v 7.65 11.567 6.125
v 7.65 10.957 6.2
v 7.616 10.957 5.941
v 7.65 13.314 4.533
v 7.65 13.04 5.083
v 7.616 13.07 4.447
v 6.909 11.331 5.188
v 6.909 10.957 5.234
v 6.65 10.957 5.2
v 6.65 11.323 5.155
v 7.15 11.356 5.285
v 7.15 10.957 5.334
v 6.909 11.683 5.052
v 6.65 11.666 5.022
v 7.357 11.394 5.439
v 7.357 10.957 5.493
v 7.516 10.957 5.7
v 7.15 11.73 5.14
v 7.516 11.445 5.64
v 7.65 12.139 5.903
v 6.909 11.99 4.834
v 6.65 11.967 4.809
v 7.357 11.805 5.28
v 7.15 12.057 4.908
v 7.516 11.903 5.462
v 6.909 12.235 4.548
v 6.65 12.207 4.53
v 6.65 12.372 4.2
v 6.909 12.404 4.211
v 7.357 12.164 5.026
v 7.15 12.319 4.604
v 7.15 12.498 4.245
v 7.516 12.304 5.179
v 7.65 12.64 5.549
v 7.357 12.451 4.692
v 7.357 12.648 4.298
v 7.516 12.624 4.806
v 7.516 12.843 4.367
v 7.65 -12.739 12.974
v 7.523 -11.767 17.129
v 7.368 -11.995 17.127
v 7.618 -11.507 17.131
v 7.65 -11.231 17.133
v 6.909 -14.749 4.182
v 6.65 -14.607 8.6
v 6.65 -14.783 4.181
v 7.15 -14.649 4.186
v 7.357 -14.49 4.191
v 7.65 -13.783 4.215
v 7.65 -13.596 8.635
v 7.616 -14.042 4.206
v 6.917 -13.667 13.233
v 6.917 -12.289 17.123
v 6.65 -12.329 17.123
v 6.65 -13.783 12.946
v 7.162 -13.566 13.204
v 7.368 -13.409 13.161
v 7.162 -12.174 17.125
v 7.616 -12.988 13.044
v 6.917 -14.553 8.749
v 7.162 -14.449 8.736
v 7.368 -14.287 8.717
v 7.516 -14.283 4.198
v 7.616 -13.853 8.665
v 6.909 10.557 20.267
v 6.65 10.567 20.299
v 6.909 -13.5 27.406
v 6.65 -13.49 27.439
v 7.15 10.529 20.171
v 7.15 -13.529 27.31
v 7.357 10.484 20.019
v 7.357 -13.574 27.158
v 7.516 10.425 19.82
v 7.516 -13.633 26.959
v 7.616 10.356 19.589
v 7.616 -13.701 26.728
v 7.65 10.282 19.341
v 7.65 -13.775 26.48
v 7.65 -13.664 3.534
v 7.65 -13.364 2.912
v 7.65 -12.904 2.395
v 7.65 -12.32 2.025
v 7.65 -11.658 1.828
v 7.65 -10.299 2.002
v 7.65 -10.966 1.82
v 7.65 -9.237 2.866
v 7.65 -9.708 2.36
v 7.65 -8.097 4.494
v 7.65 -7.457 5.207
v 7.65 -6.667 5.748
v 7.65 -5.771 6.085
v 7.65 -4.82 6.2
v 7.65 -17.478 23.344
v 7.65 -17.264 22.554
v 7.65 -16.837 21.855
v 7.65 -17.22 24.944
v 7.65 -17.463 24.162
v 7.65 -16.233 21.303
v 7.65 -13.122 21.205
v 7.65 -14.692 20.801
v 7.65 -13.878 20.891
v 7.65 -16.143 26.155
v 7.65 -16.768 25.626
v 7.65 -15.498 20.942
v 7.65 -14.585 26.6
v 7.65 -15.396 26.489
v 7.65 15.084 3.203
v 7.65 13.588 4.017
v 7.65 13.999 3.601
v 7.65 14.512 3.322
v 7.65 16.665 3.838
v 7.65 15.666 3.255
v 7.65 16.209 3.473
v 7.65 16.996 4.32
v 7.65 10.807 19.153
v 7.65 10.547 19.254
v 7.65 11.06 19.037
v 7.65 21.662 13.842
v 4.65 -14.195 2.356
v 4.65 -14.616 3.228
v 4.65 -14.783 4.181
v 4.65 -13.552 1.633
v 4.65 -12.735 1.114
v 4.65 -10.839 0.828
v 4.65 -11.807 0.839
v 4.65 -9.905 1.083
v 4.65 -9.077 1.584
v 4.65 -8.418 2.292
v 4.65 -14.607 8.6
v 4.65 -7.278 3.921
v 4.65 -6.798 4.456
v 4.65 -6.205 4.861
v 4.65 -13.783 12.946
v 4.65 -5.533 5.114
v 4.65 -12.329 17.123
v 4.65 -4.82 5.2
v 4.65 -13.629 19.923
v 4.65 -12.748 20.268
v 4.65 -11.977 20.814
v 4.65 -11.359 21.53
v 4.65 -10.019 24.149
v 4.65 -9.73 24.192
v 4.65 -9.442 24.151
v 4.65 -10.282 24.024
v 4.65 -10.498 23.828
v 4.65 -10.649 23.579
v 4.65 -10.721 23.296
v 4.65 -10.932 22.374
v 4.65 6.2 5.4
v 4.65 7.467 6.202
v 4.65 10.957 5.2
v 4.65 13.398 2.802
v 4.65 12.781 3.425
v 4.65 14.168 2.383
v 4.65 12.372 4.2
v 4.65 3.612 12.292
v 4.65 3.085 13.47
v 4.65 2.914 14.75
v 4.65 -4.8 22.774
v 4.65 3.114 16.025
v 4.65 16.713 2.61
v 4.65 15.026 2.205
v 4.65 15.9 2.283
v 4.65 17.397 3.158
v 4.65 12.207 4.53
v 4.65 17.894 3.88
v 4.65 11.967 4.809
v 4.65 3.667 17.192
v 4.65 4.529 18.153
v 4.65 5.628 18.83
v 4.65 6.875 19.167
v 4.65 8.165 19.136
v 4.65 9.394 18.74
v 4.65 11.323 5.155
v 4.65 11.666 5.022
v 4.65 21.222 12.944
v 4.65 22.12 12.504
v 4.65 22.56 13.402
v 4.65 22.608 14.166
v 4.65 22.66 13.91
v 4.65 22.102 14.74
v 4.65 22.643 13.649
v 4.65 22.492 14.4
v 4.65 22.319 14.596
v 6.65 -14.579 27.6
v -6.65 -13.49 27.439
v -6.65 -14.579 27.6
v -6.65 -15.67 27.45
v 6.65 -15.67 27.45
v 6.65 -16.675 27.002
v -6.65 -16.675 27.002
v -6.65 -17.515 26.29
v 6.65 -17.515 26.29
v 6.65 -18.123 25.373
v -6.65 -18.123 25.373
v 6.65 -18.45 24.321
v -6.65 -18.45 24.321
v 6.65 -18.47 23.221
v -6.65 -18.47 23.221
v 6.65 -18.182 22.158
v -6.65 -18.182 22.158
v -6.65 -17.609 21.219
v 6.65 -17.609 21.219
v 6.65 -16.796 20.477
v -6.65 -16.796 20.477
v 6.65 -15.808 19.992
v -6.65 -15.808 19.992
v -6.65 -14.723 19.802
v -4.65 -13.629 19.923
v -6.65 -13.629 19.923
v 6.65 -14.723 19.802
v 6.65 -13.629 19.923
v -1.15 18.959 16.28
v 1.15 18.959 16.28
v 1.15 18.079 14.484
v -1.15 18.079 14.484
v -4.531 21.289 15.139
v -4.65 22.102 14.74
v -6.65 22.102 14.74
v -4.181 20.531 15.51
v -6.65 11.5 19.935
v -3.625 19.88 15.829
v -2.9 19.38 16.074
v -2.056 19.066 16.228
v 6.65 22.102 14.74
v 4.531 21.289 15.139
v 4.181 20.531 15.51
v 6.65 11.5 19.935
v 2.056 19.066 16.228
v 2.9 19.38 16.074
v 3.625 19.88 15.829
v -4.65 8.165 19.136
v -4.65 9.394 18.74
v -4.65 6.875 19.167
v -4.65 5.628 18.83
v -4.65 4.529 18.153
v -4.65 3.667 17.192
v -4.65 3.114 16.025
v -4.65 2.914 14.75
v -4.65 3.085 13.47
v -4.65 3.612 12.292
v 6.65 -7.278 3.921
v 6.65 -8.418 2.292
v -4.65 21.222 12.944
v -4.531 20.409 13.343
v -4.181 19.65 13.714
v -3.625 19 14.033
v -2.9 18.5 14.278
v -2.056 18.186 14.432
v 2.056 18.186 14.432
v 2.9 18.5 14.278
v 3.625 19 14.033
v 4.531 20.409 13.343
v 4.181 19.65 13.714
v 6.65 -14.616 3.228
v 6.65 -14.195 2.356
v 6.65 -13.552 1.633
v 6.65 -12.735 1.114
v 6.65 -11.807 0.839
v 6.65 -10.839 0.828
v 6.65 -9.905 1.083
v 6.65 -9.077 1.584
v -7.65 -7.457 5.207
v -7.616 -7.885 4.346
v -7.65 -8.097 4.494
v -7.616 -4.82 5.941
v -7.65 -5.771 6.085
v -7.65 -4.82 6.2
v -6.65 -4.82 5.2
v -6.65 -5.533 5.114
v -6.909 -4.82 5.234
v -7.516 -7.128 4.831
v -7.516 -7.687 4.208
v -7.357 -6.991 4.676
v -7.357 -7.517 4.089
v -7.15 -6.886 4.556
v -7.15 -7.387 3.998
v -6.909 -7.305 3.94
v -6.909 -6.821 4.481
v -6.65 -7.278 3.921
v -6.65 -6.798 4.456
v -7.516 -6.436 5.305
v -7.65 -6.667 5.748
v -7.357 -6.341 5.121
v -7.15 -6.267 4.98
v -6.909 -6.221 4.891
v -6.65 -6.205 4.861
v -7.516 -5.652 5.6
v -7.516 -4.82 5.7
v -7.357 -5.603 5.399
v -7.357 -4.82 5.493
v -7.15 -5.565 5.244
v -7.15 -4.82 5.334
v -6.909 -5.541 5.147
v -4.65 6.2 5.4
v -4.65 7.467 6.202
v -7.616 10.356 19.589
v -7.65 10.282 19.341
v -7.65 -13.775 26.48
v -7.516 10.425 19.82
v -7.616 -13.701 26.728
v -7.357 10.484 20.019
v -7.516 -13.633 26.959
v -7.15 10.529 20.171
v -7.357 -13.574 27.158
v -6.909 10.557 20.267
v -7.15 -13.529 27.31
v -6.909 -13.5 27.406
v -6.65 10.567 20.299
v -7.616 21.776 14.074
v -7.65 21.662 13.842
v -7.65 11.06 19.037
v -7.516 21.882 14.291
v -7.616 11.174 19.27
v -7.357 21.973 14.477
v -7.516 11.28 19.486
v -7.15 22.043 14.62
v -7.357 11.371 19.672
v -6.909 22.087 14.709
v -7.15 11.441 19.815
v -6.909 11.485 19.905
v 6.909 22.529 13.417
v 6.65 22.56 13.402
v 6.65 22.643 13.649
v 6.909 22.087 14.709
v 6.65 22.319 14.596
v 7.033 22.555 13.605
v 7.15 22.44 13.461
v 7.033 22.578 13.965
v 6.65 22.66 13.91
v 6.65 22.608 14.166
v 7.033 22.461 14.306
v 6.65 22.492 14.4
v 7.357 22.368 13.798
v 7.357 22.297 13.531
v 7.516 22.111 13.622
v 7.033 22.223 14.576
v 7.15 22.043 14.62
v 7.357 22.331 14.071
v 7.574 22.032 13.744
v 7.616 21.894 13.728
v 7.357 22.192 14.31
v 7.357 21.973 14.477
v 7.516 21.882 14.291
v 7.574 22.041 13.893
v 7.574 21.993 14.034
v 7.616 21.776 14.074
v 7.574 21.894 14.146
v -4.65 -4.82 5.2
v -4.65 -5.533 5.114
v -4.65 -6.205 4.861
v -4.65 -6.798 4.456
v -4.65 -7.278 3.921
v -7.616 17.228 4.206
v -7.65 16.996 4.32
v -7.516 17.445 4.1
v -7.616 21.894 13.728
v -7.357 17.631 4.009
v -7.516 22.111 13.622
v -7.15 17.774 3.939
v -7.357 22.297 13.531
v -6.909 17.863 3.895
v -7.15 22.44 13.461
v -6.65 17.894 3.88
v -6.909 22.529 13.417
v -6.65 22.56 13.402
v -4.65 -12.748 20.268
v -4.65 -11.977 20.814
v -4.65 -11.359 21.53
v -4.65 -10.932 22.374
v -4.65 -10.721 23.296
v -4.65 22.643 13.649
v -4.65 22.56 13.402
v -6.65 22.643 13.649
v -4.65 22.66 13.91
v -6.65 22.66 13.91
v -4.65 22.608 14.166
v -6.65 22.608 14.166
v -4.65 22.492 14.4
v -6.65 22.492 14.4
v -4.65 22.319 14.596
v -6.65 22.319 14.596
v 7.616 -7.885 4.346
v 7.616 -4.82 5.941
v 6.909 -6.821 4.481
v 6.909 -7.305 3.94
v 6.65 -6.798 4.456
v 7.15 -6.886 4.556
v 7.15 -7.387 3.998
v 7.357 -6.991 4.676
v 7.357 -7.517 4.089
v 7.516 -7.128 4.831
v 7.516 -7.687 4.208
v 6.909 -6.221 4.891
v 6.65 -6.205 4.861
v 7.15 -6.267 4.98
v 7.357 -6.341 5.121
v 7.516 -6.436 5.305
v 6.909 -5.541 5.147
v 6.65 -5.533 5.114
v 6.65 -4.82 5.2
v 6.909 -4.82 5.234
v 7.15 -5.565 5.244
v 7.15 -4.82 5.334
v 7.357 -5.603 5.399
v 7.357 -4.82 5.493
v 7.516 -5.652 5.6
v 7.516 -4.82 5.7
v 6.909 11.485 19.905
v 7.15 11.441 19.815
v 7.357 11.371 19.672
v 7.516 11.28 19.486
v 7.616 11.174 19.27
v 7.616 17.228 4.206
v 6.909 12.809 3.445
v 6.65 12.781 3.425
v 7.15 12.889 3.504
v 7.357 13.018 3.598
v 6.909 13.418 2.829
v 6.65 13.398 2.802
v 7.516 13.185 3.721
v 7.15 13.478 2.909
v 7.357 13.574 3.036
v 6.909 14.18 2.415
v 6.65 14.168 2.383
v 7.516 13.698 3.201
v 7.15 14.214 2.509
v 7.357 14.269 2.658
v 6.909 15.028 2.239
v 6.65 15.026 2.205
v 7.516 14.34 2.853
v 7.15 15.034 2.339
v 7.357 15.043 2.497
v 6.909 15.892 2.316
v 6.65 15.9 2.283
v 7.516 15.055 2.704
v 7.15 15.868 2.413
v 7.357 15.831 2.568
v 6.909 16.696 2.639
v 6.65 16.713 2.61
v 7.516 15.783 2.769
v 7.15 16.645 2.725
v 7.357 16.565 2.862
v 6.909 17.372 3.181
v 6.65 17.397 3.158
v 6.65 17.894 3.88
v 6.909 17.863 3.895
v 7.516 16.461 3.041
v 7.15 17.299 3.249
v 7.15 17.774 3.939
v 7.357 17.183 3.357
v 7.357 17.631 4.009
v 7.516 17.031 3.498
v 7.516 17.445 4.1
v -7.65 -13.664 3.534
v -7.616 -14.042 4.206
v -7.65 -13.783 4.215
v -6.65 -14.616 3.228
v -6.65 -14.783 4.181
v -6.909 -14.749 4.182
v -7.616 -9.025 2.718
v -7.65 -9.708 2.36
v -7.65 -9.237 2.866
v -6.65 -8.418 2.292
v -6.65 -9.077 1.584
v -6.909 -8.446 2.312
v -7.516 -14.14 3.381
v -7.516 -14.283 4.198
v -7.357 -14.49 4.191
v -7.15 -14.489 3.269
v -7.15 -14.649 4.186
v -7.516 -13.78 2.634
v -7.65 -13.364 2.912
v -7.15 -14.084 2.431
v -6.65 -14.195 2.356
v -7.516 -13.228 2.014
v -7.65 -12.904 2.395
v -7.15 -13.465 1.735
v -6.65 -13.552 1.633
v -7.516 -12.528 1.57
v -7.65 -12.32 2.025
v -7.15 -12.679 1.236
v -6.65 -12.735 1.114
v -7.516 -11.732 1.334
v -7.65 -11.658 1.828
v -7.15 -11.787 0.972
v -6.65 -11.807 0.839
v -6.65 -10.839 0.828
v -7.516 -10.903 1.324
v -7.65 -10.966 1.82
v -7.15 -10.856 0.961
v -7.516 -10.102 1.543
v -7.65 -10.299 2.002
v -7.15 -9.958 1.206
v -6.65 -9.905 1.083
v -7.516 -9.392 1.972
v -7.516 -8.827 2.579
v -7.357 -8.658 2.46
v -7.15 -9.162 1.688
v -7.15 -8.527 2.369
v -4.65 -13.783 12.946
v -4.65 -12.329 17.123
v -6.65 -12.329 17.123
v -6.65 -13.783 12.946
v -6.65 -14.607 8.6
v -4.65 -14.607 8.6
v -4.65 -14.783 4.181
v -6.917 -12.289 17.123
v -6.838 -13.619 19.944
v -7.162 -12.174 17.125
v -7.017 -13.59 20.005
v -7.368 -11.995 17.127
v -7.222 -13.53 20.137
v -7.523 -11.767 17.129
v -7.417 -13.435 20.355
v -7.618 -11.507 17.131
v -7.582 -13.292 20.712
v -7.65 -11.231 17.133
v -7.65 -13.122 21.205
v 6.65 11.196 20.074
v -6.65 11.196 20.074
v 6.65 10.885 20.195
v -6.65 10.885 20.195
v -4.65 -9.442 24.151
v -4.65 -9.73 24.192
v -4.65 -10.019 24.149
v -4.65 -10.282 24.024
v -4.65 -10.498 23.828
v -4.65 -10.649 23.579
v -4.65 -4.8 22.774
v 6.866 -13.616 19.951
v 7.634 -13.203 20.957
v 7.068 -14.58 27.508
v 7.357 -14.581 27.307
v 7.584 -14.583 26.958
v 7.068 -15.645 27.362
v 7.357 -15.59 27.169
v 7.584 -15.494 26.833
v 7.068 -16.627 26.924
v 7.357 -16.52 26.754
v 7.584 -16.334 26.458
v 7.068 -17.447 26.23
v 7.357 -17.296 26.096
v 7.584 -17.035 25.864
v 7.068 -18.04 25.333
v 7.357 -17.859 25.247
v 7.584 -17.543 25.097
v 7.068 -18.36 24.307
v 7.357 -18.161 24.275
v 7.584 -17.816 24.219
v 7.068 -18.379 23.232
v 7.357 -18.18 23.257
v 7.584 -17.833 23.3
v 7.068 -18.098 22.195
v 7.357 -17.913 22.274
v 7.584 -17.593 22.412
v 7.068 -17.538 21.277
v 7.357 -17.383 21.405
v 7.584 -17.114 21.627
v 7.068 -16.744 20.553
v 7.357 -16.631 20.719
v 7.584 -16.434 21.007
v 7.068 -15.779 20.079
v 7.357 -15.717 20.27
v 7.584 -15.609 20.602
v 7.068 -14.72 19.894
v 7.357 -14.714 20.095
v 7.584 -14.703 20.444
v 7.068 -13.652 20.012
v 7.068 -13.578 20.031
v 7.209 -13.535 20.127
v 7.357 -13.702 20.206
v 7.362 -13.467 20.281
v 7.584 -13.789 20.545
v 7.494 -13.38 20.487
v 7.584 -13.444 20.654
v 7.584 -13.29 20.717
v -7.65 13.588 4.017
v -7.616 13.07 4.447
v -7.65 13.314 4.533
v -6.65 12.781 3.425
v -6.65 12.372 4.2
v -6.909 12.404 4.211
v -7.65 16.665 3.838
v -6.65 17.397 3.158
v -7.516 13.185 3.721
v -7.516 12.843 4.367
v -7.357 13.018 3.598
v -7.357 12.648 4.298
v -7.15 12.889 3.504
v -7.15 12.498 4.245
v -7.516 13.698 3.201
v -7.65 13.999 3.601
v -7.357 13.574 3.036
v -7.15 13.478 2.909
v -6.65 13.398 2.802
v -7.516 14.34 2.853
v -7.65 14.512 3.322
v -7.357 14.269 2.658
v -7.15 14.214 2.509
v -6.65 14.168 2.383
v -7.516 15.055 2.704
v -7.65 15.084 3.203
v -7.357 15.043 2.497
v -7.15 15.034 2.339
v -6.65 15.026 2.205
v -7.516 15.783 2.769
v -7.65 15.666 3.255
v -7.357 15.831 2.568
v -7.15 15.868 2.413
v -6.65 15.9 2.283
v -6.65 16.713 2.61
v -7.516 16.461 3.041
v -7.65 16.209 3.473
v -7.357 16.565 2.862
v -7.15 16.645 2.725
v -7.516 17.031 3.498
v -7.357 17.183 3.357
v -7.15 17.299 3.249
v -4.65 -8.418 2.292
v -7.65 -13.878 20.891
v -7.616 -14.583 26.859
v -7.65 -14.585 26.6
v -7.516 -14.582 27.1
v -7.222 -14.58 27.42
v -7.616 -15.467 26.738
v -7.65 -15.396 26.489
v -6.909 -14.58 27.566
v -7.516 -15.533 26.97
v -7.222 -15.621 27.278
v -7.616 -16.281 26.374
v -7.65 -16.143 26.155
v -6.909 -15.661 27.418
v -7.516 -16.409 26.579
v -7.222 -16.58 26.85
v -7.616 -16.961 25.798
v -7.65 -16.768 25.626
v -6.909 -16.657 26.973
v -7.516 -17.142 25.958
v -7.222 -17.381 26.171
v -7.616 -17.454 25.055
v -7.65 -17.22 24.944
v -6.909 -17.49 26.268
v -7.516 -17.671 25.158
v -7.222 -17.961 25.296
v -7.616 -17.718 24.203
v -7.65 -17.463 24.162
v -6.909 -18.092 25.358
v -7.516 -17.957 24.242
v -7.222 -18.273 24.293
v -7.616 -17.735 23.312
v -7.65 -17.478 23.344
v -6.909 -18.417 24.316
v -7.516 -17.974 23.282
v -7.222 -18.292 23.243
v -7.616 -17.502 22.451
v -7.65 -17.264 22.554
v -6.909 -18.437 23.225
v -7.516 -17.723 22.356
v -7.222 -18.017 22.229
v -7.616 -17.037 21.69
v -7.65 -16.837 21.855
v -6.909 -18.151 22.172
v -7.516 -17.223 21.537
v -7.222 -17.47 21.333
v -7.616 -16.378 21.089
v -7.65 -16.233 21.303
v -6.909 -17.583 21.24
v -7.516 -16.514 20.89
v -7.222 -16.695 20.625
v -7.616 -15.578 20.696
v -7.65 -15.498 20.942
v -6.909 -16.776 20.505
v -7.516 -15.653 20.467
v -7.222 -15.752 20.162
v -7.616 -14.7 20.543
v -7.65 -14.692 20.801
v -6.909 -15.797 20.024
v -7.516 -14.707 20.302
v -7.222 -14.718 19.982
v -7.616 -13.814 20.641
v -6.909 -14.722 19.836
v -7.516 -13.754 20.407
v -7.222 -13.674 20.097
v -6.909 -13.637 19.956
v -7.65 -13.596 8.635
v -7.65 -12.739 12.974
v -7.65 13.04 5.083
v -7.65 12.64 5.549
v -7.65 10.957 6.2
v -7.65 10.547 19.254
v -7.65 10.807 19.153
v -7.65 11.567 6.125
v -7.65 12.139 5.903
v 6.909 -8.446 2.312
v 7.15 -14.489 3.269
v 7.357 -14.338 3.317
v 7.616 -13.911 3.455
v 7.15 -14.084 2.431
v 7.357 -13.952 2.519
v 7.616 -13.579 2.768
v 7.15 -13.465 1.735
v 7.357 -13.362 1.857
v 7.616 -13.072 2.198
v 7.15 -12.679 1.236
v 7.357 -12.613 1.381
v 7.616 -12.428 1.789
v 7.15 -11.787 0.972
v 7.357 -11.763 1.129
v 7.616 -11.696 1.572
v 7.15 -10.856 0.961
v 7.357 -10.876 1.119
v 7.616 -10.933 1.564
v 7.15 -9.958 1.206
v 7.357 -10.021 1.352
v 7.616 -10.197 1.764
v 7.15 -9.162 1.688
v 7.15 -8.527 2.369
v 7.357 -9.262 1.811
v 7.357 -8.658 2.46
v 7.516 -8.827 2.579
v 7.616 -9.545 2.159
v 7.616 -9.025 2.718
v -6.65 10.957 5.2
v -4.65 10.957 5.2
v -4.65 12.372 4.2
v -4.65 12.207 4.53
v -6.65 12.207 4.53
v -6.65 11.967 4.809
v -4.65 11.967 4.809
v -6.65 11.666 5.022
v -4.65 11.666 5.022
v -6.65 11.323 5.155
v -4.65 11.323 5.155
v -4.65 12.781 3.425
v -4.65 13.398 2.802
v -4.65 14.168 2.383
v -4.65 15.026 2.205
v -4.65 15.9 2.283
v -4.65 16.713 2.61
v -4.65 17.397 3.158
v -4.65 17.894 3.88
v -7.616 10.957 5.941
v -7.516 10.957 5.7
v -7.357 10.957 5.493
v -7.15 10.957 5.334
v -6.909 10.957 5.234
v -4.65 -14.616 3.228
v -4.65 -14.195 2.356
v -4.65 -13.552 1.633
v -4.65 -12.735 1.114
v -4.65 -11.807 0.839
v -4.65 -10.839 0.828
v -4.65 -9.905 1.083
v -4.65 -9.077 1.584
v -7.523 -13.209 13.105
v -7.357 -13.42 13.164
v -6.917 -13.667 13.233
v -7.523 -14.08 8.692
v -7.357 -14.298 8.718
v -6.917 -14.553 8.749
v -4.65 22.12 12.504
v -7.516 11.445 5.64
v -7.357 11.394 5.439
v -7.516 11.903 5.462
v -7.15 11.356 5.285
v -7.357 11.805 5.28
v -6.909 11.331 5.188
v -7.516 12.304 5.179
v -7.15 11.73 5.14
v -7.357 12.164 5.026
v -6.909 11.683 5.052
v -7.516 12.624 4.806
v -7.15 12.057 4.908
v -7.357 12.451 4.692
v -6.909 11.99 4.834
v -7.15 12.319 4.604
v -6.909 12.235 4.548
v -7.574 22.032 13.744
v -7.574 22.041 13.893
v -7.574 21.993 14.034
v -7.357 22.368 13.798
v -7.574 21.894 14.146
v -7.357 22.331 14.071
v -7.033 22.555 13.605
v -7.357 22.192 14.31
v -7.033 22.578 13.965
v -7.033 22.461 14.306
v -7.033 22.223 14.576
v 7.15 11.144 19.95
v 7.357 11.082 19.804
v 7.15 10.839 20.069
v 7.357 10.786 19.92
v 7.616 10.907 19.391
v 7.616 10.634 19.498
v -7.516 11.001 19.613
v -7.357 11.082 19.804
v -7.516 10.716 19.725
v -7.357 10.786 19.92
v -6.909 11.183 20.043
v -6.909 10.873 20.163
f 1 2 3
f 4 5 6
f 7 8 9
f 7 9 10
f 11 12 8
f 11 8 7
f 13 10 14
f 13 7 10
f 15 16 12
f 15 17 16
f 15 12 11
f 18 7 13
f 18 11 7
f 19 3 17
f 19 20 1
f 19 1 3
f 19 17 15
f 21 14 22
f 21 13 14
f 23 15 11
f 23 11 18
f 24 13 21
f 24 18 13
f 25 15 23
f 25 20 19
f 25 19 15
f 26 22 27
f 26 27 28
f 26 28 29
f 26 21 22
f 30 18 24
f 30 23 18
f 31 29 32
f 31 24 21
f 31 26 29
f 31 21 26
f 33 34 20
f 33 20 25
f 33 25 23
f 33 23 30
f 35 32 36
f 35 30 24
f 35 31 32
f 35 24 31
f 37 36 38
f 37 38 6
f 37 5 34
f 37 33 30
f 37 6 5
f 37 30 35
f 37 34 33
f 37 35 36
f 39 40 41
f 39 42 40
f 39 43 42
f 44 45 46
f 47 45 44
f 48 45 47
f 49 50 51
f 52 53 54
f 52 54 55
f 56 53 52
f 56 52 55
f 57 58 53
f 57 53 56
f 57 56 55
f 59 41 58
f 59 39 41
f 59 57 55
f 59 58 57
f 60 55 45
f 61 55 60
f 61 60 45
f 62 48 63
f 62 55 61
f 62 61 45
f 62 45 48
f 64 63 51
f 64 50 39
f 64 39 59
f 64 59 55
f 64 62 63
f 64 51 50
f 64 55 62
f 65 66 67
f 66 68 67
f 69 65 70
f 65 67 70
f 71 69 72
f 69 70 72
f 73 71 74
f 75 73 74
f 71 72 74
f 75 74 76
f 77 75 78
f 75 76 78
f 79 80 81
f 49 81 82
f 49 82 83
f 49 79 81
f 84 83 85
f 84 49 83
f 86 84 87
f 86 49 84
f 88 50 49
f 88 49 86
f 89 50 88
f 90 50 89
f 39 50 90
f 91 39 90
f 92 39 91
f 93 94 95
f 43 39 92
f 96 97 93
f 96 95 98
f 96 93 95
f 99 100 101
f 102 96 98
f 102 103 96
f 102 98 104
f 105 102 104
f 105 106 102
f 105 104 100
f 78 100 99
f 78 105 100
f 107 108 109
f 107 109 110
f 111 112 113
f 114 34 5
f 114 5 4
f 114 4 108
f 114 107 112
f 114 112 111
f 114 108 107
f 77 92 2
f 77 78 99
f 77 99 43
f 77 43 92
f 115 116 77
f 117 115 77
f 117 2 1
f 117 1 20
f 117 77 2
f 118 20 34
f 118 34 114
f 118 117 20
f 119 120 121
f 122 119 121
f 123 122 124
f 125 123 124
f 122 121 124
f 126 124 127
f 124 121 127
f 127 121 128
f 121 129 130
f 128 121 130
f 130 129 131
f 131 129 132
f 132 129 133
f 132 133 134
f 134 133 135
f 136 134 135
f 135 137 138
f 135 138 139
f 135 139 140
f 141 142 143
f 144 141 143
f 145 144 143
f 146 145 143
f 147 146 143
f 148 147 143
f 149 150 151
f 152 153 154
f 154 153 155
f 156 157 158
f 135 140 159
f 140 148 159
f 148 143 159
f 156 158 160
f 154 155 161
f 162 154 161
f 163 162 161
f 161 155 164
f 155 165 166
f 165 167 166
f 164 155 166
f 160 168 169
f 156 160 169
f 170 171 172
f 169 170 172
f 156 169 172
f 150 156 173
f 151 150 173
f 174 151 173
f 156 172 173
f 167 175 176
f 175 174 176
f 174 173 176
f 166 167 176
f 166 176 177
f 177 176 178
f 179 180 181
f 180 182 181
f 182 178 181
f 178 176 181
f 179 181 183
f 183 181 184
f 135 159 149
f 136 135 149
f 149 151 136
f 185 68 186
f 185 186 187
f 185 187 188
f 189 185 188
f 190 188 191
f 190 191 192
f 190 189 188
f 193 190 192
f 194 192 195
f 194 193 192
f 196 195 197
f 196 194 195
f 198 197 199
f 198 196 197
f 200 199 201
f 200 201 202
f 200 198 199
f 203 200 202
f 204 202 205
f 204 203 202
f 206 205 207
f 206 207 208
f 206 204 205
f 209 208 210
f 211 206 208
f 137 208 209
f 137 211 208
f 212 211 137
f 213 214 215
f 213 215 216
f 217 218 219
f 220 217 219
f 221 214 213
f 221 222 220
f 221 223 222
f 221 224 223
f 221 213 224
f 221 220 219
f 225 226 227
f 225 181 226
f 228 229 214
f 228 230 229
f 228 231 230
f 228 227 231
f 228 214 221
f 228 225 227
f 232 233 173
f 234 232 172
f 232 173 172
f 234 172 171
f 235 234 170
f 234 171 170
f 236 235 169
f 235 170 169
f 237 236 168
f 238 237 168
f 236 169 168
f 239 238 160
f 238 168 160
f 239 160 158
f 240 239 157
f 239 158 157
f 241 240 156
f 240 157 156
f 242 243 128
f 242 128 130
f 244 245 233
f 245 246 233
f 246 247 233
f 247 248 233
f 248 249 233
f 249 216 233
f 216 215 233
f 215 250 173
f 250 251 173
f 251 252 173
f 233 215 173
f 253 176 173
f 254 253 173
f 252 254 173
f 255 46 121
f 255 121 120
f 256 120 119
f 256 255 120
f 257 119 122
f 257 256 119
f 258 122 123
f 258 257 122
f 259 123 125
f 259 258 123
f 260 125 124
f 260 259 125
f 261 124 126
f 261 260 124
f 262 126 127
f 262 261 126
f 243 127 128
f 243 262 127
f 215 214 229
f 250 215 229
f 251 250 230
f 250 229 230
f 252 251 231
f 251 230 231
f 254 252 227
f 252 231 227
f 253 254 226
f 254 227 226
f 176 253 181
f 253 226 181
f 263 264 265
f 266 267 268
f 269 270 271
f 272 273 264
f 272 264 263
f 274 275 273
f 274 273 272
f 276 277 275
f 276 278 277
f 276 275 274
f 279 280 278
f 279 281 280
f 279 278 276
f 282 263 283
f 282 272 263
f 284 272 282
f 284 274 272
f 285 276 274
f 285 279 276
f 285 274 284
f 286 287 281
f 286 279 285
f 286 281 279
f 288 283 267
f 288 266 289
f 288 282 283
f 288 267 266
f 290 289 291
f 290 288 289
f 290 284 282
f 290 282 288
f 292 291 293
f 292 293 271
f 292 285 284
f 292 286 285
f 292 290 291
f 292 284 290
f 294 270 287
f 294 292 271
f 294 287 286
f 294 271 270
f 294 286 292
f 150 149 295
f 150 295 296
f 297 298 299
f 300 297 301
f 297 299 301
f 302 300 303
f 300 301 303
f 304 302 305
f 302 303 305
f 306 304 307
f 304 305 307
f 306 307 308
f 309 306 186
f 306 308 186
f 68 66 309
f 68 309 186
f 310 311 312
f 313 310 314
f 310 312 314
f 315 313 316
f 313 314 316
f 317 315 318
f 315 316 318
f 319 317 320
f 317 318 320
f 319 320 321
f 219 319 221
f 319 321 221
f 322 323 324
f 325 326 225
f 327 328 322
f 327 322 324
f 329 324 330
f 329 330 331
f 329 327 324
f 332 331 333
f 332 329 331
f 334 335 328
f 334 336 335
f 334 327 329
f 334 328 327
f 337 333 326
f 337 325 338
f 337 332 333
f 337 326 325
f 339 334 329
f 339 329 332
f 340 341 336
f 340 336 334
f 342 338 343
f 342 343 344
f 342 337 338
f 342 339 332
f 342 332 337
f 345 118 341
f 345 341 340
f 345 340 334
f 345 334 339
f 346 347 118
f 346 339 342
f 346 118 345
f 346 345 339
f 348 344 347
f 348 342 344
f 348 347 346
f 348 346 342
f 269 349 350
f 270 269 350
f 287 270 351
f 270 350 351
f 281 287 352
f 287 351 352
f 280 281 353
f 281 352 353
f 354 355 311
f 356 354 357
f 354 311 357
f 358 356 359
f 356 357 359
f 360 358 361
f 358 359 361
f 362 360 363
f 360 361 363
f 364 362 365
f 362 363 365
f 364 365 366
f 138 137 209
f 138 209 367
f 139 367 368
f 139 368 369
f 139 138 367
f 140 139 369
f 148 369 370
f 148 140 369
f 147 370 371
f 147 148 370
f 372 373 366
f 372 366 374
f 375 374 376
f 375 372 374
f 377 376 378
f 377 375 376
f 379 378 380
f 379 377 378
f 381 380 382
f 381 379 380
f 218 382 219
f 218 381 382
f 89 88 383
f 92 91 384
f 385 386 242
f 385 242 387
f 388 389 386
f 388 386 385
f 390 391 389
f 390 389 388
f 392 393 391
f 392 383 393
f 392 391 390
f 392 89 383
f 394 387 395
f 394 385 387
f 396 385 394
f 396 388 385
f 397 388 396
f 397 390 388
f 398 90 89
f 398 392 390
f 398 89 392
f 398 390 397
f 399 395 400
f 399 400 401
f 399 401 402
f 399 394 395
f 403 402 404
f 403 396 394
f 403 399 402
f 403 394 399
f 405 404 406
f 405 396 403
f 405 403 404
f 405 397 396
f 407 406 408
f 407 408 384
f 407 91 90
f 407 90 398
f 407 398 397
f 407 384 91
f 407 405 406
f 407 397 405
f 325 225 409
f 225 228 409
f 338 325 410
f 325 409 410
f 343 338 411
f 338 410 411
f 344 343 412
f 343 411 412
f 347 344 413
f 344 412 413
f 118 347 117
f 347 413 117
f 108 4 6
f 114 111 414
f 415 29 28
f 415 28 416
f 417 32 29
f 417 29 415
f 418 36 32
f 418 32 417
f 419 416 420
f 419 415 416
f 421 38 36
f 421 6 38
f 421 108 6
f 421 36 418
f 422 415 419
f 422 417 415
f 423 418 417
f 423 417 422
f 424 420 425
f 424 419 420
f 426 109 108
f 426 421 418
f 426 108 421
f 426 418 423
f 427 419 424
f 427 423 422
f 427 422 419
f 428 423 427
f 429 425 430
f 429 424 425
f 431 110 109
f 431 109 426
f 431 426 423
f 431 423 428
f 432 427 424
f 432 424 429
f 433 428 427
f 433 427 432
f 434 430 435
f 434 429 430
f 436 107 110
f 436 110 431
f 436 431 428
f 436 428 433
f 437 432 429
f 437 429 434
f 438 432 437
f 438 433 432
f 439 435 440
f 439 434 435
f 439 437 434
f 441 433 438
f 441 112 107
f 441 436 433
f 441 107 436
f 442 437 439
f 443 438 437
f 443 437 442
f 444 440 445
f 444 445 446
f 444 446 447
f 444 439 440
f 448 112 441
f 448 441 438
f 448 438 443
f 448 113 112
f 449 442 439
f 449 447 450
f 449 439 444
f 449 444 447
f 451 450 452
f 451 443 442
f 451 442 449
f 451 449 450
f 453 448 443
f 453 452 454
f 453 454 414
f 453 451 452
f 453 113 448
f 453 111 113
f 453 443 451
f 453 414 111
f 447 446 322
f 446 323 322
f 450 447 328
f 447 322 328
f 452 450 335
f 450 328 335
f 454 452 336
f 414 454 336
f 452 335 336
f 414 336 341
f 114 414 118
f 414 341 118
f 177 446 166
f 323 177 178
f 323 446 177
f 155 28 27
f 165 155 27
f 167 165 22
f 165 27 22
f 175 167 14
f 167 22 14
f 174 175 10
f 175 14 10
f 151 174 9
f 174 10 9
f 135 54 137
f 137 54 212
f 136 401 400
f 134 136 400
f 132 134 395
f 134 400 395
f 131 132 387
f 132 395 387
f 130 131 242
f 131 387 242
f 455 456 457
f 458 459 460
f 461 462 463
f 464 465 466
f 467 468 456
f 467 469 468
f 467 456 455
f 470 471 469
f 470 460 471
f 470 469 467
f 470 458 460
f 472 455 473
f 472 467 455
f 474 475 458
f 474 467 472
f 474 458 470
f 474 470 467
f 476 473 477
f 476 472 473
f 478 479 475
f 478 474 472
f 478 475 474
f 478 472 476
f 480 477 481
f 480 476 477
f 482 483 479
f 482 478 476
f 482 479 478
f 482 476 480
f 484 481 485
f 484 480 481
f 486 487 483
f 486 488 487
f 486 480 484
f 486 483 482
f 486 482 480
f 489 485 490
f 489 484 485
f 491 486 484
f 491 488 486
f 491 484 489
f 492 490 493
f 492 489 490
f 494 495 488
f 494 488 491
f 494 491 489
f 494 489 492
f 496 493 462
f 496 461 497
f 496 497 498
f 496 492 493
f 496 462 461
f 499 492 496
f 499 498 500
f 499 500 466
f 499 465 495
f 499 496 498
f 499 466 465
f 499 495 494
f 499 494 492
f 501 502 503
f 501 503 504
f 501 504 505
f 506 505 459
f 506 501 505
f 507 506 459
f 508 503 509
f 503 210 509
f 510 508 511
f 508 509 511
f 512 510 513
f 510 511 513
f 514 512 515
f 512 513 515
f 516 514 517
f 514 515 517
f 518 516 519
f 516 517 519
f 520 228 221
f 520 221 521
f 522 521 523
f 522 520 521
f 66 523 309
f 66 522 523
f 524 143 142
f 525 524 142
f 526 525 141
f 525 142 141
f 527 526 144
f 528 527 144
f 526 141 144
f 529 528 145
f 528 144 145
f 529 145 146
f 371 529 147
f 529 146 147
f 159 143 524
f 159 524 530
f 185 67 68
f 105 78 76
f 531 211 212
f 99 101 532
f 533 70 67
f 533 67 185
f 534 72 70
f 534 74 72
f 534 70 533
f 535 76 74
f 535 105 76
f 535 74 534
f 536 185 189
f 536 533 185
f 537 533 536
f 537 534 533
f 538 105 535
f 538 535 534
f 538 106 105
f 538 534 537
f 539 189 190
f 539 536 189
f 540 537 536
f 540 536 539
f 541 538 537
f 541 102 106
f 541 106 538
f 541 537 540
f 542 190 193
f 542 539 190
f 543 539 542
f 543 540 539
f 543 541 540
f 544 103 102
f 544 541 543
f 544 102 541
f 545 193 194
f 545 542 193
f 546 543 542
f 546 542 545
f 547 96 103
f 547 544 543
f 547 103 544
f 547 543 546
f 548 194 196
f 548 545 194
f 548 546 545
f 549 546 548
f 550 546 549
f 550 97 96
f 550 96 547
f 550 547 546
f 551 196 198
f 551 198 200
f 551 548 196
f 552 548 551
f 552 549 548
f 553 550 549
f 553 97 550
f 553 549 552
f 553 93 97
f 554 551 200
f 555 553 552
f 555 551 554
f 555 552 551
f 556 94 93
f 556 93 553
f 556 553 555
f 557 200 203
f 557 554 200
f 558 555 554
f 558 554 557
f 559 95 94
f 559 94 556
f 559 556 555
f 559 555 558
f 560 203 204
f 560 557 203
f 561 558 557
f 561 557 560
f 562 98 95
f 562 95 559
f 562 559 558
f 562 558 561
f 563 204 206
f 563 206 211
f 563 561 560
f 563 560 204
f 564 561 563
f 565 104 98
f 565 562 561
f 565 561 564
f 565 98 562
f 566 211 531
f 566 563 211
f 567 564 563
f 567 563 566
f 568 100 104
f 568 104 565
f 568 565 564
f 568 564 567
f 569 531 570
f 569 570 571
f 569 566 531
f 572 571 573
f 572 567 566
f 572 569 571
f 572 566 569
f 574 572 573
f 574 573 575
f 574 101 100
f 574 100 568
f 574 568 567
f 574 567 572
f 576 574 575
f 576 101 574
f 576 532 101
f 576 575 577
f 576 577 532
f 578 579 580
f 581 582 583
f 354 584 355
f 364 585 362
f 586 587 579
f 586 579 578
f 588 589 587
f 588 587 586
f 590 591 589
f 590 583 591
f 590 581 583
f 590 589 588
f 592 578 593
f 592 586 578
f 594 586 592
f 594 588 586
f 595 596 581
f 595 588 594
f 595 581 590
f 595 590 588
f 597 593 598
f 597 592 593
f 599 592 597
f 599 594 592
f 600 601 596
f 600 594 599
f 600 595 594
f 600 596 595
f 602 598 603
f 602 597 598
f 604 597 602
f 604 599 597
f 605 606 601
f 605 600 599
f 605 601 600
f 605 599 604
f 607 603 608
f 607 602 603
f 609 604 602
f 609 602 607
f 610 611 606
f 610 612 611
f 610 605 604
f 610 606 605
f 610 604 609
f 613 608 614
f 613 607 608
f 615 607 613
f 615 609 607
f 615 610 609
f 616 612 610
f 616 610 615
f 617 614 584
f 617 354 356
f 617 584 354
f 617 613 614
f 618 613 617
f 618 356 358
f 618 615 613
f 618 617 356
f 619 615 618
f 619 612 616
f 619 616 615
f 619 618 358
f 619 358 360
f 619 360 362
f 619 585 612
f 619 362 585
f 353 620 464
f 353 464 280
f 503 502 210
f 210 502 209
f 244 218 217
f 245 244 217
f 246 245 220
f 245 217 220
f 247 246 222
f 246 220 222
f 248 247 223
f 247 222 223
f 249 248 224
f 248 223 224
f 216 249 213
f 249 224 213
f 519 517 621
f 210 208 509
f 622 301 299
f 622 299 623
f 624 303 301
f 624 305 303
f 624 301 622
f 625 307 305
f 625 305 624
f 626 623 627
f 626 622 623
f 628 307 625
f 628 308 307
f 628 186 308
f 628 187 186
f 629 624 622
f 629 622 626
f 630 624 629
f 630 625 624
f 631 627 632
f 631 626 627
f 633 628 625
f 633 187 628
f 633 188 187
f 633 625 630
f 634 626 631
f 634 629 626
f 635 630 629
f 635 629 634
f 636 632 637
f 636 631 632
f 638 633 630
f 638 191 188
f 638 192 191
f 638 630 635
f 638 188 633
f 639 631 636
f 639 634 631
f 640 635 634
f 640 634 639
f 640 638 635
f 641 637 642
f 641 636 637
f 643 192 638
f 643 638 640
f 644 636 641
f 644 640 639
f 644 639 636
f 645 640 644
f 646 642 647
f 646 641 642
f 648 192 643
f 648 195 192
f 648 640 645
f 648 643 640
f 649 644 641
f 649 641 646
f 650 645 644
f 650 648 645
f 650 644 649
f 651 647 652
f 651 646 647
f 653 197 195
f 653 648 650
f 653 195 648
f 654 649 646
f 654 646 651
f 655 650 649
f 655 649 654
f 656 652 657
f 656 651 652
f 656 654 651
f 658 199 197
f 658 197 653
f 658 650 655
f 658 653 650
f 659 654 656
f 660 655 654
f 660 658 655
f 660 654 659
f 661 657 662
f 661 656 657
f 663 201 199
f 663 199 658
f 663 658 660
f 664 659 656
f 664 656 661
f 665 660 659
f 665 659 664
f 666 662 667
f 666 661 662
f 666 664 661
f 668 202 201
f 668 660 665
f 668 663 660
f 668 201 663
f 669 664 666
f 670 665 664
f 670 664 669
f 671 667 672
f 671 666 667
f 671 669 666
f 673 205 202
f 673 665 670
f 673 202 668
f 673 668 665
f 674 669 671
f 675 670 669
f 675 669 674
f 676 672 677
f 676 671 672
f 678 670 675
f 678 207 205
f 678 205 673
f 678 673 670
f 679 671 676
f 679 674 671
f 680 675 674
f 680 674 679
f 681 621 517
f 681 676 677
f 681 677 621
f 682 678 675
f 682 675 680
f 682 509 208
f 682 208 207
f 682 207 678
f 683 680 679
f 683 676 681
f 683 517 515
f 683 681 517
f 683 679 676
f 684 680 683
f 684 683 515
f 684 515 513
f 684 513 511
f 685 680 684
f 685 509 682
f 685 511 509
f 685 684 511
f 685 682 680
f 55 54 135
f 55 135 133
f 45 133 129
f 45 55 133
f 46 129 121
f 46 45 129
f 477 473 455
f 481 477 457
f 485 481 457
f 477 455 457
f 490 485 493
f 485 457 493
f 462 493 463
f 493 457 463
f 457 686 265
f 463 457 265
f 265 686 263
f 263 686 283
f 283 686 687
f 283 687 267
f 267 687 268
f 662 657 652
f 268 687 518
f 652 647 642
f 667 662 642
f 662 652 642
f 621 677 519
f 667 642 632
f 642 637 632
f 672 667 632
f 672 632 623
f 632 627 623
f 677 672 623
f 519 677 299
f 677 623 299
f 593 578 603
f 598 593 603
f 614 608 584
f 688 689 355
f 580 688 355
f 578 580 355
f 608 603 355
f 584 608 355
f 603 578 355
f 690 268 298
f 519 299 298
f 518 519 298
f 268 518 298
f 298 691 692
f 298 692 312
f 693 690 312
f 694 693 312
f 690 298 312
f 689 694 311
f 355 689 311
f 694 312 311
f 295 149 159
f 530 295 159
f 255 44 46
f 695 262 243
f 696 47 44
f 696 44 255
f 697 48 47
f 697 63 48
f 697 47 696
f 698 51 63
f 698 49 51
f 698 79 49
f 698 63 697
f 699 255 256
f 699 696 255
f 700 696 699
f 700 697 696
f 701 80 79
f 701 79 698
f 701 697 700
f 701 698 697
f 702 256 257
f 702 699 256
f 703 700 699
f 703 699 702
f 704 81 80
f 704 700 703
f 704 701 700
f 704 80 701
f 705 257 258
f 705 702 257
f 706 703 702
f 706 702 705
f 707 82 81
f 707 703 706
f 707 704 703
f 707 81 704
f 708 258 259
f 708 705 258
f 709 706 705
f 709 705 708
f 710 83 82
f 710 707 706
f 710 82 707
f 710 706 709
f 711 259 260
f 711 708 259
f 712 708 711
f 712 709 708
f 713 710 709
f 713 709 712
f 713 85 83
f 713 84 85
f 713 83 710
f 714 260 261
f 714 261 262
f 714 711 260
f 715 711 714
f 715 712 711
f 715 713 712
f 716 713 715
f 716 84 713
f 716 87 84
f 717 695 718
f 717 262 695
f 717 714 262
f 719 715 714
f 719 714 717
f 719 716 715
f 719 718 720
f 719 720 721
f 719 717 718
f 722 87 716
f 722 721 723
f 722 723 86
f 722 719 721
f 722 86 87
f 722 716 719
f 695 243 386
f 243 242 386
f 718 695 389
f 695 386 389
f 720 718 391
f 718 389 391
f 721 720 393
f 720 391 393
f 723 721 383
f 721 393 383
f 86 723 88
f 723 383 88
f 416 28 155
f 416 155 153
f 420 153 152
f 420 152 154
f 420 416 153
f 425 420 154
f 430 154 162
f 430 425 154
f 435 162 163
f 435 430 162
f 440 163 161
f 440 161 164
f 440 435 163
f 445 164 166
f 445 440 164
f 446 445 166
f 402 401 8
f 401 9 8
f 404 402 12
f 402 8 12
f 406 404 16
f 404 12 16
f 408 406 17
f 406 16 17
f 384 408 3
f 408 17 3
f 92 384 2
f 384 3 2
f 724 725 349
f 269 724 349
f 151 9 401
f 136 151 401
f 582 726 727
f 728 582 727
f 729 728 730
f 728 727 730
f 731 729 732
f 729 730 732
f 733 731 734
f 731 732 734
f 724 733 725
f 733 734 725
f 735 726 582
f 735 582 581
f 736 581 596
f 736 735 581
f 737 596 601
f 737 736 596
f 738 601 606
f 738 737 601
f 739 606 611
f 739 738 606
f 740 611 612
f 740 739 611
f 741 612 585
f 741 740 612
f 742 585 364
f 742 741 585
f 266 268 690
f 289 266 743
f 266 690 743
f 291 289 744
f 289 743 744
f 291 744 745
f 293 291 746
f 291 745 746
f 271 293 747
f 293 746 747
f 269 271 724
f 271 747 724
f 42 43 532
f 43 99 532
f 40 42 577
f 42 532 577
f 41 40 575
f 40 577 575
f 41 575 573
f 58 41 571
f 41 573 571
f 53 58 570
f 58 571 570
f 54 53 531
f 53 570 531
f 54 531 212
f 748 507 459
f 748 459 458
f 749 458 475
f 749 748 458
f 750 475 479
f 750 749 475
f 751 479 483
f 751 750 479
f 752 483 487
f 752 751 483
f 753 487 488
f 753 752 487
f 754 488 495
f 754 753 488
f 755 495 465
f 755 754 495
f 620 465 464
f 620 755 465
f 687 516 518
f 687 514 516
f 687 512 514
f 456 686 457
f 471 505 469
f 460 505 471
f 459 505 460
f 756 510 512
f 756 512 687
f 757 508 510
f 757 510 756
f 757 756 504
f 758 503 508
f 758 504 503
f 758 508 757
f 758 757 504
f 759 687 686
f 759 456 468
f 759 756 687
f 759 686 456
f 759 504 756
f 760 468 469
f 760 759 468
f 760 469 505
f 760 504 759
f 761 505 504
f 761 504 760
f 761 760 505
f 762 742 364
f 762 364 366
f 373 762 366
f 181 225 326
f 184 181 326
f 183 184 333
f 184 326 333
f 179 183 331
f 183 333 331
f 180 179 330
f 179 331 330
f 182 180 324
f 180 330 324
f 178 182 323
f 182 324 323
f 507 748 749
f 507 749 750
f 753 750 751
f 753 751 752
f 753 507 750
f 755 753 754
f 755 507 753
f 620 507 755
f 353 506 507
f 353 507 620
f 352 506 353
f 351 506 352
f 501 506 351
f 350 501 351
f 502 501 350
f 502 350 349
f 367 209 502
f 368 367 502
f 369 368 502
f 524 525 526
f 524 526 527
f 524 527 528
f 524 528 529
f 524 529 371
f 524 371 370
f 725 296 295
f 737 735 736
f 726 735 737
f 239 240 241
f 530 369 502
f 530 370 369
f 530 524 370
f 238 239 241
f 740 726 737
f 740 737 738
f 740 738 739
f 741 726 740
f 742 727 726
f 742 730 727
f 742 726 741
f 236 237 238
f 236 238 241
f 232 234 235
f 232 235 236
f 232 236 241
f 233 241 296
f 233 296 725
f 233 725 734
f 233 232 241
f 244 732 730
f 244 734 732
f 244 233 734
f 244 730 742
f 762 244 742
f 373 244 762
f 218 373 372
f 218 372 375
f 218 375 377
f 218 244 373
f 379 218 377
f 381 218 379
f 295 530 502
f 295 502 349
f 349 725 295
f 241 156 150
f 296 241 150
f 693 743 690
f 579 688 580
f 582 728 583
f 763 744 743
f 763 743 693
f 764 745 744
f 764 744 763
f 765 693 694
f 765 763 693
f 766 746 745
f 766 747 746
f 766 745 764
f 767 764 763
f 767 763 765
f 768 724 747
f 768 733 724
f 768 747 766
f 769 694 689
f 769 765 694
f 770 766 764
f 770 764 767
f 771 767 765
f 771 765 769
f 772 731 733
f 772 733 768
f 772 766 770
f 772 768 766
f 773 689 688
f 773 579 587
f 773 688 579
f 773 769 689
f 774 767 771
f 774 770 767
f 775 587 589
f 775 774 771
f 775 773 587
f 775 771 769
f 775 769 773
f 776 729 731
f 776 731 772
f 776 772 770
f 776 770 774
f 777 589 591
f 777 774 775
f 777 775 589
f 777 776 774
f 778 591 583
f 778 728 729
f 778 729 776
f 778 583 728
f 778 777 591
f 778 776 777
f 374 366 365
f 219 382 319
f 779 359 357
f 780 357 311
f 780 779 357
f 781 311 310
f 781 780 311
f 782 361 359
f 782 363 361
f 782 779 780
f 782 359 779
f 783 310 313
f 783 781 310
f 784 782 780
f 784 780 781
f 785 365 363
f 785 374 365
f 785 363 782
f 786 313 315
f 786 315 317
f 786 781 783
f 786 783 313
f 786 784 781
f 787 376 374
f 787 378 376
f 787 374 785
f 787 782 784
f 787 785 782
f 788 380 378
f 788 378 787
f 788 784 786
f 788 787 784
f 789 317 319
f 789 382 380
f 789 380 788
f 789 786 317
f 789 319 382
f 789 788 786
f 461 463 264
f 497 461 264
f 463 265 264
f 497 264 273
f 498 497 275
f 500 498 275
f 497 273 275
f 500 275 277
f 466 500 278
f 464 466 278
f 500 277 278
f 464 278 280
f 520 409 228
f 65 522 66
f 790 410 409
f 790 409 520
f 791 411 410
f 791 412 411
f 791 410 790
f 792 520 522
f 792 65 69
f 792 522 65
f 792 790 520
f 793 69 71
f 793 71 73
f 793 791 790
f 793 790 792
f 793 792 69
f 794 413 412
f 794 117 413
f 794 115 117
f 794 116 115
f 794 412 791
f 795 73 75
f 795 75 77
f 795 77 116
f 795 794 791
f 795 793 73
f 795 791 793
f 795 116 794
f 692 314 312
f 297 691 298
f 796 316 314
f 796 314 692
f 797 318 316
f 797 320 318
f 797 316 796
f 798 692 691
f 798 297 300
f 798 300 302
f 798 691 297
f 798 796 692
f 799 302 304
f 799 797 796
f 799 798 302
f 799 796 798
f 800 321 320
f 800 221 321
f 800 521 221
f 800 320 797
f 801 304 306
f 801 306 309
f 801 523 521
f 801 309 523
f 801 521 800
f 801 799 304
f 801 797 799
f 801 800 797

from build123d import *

# Parameters (mm, degrees)
PAD004_DEPTH    = 7.65
POCKET003_DEPTH = 4.65
POCKET004_DEPTH = 2
FILLET007_R     = 1
FILLET008_R     = 1


with BuildPart() as part:
    # Sketch009 → Pad004 (new body, symmetric)
    with BuildSketch(Plane.YZ):
        with BuildLine():
            ThreePointArc((-2.8284271247, -1), (-0.1735950846, -2.9949732464), (2.6939497909, -1.3200888318))
            Line((2.6939497909, -1.3200888318), (7.8, 9.1))
            Line((7.8, 9.1), (-3.7, 14.7352281014))
            ThreePointArc((-3.7, 14.7352281014), (-4.158961759, 14.9368094594), (-4.6331484619, 15.0993760945))
            Line((-4.6331484619, 15.0993760945), (-28.6904310189, 22.2388309237))
            ThreePointArc((-28.6904310189, 22.2388309237), (-33.6993372116, 18.5718979166), (-28.8290152057, 14.7228067922))
            Line((-27.5290152057, 11.9228067922), (-28.8290152057, 14.7228067922))
            ThreePointArc((-27.5290152057, 11.9228067922), (-29.4749197629, 5.5883007232), (-29.9826934773, -1.0188679245))
            ThreePointArc((-29.9826934773, -1.0188679245), (-27.4803397166, -4.255402597), (-23.6176804166, -2.9075175272))
            Line((-23.6176804166, -2.9075175272), (-22.4775697078, -1.2792706909))
            ThreePointArc((-20.0201135749, 0), (-21.4053594146, -0.3389675005), (-22.4775697078, -1.2792706909))
            Line((-4.2426406871, 0), (-20.0201135749, 0))
            ThreePointArc((-2.8284271247, -1), (-3.3766152833, -0.2752551286), (-4.2426406871, 0))
        make_face()
    extrude(amount=PAD004_DEPTH, both=True)

    # Sketch010 → Pocket003 (cut, symmetric)
    with BuildSketch(Plane.YZ):
        with BuildLine():
            Line((6.9199407788, 7.3040334727), (-5.8060355253, 13.5400142802))
            ThreePointArc((-5.8060355253, 13.5400142802), (-11.1364622888, 12.5033421393), (-11.5881769744, 7.0918642957))
            Line((-11.5881769744, 7.0918642957), (-7.7326639328, 1.0024084327))
            Line((-9, 0.2), (-7.7326639328, 1.0024084327))
            Line((-9, 0.2), (-20, 17.5735670895))
            Line((-24.6418524264, 18.9511248267), (-20, 17.5735670895))
            ThreePointArc((-24.6418524264, 18.9511248267), (-25.4821110434, 18.8237971917), (-25.9209782539, 18.0960318164))
            ThreePointArc((-28.8290152057, 14.7228067922), (-26.8461376765, 15.9534931036), (-25.9209782539, 18.0960318164))
            Line((-28.8290152057, 14.7228067922), (-34.6400816793, 13.2289840317))
            Line((-34.6400816793, 13.2289840317), (-31.0800592212, -4.6959665273))
            Line((-31.0800592212, -4.6959665273), (6.9199407788, -4.6959665273))
            Line((6.9199407788, -4.6959665273), (6.9199407788, 7.3040334727))
        make_face()
    extrude(amount=POCKET003_DEPTH, both=True, mode=Mode.SUBTRACT)

    # Sketch011 (on Face6 of Pocket003) → Pocket004 (cut)
    with BuildSketch(Plane(origin=(0, 5.1060502091, 10.4200888318), x_dir=(0, -0.8979832636, 0.4400296106), z_dir=(0, 0.4400296106, 0.8979832636))):
        with BuildLine():
            Line((-3, 4.65), (-2, 4.65))
            ThreePointArc((1.5, 1.15), (0.4748737342, 3.6248737342), (-2, 4.65))
            Line((1.5, 1.15), (1.5, -1.15))
            ThreePointArc((-2, -4.65), (0.4748737342, -3.6248737342), (1.5, -1.15))
            Line((-2, -4.65), (-3, -4.65))
            Line((-3, -4.65), (-3, 4.65))
        make_face()
    extrude(amount=-POCKET004_DEPTH, mode=Mode.SUBTRACT)

    # Fillet007
    fillet007_edges = [part.edges().sort_by_distance(p)[0] for p in [
        (-6.15, 7.8, 9.1),
        (6.15, 7.8, 9.1),
    ]]
    fillet(fillet007_edges, radius=FILLET007_R)

    # Fillet008
    fillet008_edges = [part.edges().sort_by_distance(p)[0] for p in [
        (7.65, -16.66179, 18.669104),
        (-7.65, -16.66179, 18.669104),
        (-7.65, -28.179015, 13.322807),
        (7.65, -28.179015, 13.322807),
    ]]
    fillet(fillet008_edges, radius=FILLET008_R)


with BuildPart() as part_1:
    # Body003 placement: moved
    add(part.part.moved(Location((0, 15.2, 5.2))))


solid = part_1.part
